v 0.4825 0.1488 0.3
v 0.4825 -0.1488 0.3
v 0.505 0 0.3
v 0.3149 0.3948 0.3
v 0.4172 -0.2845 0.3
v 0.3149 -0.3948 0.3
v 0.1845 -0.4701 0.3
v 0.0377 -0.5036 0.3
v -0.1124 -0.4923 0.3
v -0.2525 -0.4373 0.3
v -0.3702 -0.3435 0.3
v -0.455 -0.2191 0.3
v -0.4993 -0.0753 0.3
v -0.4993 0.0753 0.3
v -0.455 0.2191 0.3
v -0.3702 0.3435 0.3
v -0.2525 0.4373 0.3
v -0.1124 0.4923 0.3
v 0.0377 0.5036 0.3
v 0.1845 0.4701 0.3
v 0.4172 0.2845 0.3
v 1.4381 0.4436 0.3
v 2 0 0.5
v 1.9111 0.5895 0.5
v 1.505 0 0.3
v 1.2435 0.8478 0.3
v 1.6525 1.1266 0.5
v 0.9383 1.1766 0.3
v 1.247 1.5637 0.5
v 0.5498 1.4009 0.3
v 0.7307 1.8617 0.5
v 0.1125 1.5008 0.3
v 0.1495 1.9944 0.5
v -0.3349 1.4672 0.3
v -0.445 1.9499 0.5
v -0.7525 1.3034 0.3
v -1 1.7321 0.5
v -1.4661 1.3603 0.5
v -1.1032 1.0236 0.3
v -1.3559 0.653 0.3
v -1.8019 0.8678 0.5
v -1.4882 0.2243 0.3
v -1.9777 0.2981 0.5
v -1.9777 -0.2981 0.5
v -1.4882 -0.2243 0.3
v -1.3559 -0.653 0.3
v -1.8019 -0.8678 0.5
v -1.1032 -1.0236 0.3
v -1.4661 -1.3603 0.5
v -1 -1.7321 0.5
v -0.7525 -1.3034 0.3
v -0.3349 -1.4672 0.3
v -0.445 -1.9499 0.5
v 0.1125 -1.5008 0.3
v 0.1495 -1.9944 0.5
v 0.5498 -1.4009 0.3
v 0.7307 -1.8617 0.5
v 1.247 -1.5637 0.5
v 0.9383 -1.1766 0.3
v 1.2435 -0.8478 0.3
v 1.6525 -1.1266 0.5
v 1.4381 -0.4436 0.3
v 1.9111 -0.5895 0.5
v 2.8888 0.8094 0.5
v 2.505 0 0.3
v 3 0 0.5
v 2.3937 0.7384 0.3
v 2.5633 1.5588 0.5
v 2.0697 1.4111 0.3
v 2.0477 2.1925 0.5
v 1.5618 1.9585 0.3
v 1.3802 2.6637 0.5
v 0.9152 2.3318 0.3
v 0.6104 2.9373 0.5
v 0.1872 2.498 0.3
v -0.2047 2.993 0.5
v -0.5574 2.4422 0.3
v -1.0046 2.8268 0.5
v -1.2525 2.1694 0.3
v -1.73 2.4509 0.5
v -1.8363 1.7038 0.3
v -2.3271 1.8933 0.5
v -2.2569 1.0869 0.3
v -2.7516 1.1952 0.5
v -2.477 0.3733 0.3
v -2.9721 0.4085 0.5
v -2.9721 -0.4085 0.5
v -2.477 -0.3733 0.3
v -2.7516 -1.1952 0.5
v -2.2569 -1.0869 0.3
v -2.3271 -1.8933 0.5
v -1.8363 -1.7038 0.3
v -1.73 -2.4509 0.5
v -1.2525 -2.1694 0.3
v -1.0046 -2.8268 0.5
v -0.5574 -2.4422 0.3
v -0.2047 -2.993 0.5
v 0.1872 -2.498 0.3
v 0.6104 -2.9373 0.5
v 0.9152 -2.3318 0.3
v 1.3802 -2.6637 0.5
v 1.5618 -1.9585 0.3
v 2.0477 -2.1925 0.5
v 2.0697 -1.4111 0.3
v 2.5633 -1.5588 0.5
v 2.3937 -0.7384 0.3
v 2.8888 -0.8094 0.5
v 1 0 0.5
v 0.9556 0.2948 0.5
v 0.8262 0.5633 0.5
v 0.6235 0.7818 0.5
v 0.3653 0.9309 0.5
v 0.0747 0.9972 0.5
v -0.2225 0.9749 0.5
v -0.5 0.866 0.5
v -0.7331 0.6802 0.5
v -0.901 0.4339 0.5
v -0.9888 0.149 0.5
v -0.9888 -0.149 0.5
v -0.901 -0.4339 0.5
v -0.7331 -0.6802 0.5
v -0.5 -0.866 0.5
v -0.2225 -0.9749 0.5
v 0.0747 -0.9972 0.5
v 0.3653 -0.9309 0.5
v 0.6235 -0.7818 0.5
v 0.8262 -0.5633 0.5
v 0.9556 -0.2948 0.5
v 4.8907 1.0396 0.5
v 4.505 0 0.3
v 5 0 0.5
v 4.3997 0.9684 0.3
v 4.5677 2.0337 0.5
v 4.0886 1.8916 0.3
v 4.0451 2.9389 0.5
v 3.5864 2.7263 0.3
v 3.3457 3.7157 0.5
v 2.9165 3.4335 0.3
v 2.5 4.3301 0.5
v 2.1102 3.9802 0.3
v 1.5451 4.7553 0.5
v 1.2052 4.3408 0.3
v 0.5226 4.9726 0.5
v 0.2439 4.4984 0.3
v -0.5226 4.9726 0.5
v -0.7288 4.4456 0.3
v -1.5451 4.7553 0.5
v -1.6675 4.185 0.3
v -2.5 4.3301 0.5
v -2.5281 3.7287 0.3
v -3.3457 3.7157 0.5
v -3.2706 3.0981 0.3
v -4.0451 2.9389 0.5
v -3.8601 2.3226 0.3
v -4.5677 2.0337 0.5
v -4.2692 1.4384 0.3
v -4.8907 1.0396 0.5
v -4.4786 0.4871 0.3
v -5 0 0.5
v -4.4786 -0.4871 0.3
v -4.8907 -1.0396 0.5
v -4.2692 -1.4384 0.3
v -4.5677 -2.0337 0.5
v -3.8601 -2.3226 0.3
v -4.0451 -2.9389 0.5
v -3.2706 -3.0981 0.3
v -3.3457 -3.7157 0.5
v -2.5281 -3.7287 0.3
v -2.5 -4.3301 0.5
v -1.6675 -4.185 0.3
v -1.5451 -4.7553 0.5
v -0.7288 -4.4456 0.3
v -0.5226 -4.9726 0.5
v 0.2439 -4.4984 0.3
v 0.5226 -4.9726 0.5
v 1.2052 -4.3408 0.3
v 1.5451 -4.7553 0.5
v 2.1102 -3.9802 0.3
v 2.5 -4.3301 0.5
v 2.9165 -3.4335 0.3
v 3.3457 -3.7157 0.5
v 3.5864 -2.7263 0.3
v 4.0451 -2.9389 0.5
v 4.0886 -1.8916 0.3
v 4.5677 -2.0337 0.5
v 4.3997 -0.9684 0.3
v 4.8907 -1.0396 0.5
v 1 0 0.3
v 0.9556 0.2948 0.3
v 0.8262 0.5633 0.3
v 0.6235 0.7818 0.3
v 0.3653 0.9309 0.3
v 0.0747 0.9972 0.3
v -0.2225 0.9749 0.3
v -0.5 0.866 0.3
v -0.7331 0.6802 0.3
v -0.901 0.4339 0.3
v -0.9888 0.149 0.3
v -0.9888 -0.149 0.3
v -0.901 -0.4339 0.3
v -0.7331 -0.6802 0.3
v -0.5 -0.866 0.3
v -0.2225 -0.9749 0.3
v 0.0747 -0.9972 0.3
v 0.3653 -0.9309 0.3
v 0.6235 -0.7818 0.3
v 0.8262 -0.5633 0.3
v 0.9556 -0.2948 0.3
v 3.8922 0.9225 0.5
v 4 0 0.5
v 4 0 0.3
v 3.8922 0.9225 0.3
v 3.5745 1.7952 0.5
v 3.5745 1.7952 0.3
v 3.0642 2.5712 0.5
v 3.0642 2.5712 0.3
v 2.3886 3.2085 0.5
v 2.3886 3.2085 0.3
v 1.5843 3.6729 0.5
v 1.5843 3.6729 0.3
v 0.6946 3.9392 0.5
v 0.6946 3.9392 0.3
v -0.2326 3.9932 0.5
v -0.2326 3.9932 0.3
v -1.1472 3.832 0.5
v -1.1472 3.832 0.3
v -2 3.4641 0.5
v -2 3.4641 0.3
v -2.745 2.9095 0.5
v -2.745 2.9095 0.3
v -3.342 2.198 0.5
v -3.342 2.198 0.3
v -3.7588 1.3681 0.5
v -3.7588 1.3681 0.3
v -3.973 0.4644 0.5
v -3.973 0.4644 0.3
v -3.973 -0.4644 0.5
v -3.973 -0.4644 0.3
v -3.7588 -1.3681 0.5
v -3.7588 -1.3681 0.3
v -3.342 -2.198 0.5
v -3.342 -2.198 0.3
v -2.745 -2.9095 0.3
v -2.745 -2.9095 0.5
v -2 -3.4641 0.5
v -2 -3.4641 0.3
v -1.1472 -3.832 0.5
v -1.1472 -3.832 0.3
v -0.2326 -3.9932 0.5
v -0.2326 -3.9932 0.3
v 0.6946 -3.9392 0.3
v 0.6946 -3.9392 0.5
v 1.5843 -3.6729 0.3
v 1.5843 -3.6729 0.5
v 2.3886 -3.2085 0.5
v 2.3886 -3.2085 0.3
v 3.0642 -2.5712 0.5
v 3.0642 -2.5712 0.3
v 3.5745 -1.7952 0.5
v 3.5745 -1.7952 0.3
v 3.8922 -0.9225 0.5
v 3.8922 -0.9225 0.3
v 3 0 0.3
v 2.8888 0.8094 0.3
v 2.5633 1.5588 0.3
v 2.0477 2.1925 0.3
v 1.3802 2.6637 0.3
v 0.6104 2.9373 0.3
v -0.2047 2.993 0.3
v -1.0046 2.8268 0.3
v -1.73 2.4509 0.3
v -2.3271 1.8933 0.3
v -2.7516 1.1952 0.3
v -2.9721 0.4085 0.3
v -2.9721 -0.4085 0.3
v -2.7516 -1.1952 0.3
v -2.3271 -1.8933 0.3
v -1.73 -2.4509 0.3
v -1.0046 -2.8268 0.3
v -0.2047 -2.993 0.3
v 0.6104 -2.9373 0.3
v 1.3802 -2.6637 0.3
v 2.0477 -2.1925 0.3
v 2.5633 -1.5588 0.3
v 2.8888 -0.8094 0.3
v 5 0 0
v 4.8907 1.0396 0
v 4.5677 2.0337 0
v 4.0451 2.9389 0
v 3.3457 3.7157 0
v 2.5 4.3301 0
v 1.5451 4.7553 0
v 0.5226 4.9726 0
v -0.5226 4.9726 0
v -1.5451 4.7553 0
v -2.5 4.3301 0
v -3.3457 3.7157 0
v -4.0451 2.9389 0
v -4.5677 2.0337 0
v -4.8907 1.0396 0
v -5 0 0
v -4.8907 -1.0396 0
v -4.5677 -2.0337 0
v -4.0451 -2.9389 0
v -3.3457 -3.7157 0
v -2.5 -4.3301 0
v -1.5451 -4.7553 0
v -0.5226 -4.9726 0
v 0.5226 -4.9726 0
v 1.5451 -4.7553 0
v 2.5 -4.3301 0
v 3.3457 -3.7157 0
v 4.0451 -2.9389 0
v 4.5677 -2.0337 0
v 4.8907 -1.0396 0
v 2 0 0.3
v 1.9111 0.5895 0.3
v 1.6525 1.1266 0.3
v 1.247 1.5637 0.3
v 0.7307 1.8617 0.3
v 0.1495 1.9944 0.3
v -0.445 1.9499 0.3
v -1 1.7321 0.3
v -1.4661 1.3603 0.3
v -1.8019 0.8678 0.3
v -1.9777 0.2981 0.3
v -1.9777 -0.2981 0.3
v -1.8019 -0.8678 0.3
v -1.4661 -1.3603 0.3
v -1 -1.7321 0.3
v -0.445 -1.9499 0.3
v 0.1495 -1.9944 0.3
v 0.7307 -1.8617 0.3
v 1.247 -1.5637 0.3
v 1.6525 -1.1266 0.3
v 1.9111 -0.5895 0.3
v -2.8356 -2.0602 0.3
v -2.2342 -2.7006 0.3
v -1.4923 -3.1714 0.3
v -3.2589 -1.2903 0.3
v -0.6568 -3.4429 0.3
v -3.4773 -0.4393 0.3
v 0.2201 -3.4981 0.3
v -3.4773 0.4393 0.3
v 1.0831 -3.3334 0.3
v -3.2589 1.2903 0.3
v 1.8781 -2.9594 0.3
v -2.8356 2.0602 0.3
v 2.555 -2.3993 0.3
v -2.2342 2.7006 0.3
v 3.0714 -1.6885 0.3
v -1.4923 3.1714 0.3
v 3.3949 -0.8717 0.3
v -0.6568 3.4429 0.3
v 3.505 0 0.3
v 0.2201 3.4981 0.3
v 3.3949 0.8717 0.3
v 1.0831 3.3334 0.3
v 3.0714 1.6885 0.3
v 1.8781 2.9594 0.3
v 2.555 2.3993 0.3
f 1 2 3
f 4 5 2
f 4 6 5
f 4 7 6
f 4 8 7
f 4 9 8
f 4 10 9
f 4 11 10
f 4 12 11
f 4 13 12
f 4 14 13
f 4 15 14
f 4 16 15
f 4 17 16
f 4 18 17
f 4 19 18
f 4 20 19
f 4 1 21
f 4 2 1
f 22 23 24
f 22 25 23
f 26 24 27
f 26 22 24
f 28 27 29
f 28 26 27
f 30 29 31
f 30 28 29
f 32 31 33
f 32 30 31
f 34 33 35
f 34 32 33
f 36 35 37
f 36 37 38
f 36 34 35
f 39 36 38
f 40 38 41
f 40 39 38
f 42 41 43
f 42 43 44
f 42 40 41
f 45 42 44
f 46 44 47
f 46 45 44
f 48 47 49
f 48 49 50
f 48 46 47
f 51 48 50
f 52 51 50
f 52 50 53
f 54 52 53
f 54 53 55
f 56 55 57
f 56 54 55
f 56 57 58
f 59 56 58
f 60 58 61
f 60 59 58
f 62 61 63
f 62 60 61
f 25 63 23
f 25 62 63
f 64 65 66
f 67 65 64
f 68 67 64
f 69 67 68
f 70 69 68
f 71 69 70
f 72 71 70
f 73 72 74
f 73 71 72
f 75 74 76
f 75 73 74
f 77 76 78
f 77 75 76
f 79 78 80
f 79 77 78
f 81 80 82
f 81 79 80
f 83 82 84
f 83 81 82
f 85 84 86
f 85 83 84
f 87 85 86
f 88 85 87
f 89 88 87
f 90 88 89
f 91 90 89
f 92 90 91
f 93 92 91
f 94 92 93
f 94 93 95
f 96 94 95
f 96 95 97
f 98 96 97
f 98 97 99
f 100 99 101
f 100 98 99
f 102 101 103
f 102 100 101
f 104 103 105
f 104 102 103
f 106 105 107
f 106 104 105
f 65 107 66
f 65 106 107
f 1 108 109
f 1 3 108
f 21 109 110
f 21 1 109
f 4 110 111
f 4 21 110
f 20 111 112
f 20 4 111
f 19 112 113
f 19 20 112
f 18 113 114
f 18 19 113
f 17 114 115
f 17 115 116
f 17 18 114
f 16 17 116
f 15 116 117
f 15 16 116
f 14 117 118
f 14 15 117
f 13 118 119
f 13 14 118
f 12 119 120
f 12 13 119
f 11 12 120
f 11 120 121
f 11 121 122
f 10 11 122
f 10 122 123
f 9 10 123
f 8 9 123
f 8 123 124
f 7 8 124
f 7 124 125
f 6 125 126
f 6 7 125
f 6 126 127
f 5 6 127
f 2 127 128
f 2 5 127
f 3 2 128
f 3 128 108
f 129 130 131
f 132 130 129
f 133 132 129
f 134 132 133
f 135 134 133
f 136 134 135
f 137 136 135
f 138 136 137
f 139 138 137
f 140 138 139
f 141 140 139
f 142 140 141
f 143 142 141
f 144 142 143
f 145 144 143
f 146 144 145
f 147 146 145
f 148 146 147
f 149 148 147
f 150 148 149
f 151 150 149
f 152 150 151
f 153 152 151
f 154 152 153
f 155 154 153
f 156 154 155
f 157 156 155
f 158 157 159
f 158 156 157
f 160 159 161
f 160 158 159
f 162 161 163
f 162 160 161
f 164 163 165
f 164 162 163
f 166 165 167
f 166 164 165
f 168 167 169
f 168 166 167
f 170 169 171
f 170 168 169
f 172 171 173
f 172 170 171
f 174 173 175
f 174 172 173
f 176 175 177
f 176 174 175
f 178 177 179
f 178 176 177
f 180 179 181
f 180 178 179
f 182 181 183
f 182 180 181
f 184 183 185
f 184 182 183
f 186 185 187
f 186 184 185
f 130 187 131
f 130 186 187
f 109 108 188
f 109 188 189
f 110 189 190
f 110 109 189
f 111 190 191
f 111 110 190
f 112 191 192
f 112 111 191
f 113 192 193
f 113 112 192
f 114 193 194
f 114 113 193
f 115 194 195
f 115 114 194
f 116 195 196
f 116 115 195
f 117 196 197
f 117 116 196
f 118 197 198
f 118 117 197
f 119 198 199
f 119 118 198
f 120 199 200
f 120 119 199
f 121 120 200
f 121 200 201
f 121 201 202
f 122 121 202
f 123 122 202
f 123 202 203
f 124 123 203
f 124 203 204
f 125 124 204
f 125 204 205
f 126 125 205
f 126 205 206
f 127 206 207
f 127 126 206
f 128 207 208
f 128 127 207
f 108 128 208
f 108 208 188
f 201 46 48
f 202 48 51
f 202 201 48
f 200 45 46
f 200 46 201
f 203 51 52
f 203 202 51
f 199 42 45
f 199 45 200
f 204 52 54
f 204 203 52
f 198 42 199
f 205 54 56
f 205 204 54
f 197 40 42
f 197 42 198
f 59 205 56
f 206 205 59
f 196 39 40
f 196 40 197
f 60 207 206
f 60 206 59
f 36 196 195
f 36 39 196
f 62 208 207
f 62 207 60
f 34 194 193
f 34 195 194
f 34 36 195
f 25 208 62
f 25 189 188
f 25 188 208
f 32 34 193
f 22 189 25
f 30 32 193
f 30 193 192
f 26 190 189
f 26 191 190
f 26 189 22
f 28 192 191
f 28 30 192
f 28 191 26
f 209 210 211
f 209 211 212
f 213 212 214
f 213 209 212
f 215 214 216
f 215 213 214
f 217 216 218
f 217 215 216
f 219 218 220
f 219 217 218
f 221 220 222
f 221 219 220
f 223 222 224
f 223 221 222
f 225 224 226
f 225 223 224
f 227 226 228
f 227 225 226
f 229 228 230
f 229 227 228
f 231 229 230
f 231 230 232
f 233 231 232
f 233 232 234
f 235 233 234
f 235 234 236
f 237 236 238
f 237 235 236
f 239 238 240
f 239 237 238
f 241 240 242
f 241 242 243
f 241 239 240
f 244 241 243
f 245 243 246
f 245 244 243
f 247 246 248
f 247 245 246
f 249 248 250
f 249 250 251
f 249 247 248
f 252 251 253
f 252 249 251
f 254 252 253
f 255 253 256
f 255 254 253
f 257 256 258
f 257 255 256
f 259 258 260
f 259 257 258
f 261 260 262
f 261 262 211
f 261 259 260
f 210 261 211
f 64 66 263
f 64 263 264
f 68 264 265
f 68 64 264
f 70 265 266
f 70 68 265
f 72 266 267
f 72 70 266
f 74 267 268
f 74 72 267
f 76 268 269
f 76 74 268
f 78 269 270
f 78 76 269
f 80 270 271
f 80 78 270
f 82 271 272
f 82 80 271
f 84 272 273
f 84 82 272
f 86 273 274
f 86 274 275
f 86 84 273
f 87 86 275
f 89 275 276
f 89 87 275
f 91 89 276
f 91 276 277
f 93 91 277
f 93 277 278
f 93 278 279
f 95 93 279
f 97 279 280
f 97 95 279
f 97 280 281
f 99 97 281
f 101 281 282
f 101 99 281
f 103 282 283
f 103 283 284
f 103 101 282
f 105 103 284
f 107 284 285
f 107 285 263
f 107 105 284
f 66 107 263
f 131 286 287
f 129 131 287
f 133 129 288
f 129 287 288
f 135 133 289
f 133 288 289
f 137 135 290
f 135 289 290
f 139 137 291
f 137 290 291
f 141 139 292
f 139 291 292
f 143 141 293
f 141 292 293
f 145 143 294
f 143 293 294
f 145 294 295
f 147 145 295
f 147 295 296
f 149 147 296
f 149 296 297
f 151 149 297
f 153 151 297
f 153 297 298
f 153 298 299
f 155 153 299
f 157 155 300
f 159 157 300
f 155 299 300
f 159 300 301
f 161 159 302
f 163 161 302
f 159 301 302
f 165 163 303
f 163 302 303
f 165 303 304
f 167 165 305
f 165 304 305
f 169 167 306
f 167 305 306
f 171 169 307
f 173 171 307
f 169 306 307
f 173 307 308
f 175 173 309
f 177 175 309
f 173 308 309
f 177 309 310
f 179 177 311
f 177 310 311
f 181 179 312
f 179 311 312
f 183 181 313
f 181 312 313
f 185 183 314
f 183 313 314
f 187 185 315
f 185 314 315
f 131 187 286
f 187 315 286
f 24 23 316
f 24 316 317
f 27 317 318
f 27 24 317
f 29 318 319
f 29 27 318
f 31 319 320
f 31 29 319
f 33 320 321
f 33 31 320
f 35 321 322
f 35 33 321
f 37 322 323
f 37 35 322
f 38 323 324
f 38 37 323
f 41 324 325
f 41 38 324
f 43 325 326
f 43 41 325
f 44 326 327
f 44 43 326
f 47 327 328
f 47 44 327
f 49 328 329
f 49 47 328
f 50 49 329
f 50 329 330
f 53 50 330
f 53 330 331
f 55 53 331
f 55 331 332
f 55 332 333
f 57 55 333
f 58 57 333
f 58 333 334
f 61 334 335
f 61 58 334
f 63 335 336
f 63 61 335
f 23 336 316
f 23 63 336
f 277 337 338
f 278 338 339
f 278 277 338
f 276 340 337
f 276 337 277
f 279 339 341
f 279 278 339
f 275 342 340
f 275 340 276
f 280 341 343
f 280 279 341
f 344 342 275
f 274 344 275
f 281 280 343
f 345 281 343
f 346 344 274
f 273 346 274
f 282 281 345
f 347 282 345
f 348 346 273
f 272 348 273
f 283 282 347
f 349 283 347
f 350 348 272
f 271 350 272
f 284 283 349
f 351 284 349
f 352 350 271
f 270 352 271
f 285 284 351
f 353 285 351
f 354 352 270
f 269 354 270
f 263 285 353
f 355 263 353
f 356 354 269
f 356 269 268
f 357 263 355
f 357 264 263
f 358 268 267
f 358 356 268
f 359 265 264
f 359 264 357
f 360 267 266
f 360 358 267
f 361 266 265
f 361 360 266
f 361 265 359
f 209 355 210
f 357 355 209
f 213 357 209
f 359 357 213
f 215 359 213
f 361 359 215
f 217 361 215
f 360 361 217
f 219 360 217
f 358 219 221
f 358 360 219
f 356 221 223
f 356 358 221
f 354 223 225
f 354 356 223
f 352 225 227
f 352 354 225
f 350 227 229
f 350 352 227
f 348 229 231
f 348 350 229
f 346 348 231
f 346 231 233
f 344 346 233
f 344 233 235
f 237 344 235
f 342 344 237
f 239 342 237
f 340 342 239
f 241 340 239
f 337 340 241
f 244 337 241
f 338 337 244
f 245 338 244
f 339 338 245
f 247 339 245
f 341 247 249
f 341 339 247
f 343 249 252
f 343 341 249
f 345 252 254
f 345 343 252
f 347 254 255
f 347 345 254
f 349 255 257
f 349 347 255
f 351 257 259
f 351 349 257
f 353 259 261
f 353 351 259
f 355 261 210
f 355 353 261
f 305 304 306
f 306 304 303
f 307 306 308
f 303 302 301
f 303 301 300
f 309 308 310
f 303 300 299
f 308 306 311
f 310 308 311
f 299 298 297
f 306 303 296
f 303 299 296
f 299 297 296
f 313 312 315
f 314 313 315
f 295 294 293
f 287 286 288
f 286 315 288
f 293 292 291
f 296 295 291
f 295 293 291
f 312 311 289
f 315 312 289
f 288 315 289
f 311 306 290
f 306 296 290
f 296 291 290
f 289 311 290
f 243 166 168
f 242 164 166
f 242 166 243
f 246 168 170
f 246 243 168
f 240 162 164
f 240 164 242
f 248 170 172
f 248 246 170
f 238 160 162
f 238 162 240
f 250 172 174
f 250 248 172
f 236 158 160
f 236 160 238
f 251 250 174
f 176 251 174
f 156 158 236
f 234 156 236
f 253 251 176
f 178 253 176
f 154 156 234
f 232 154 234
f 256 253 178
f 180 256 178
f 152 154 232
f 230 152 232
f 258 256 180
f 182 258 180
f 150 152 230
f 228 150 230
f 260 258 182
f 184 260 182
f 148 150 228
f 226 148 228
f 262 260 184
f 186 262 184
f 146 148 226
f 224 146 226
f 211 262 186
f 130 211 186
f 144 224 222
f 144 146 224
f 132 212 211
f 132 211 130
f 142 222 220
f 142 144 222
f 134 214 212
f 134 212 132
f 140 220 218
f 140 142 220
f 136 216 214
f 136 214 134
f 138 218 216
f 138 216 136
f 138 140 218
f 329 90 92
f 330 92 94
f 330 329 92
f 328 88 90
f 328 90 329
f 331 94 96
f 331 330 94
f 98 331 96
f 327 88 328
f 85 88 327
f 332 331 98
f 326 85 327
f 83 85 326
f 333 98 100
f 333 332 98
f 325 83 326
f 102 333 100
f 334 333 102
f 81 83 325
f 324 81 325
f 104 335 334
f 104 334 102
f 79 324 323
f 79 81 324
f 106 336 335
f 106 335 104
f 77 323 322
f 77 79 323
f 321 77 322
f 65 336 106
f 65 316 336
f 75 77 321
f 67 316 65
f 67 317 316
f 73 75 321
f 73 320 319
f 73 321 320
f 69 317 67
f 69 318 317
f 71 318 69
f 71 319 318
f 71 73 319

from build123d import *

# Parameters (mm, degrees)
ESQUISSE1_R             = 5
BOSS_EXTRU_1_DEPTH      = 0.5
ESQUISSE2_R             = 4.5
ESQUISSE2_R_2           = 4
ESQUISSE2_R_3           = 3.5
ESQUISSE2_R_4           = 3
ESQUISSE2_R_5           = 2.5
ESQUISSE2_R_6           = 2
ESQUISSE2_R_7           = 1.5
ESQUISSE2_R_8           = 1
ESQUISSE2_R_9           = 0.5
ENL_V_MAT_EXTRU_2_DEPTH = 0.2
CHANFREIN1_SIZE         = 0.5
CHANFREIN1_SIZE_2       = 0.202013113


with BuildPart() as part:
    # Esquisse1 → Boss.-Extru.1 (new body)
    with BuildSketch(Plane.XY):
        Circle(ESQUISSE1_R)
    extrude(amount=BOSS_EXTRU_1_DEPTH)

    # Esquisse2 → Enlèv. mat.-Extru.2 (cut)
    # profile 1 of 5: a face of its own
    with BuildSketch(Plane.XY.offset(0.5)):
        Circle(ESQUISSE2_R)
        Circle(ESQUISSE2_R_2, mode=Mode.SUBTRACT)
    # profile 2 of 5: a face of its own
    with BuildSketch(Plane.XY.offset(0.5)):
        Circle(ESQUISSE2_R_3)
        Circle(ESQUISSE2_R_4, mode=Mode.SUBTRACT)
    # profile 3 of 5: a face of its own
    with BuildSketch(Plane.XY.offset(0.5)):
        Circle(ESQUISSE2_R_5)
        Circle(ESQUISSE2_R_6, mode=Mode.SUBTRACT)
    # profile 4 of 5: a face of its own
    with BuildSketch(Plane.XY.offset(0.5)):
        Circle(ESQUISSE2_R_7)
        Circle(ESQUISSE2_R_8, mode=Mode.SUBTRACT)
    # profile 5 of 5: a face of its own
    with BuildSketch(Plane.XY.offset(0.5)):
        Circle(ESQUISSE2_R_9)
    extrude(amount=-ENL_V_MAT_EXTRU_2_DEPTH, mode=Mode.SUBTRACT)

    # Chanfrein1
    # the kernel refuses this chamfer: 0.5, 0.202013113 mm, written as the material it takes off along each edge
    with BuildSketch(Plane(origin=(0, 0, 0.5), x_dir=(1, 0, 0), z_dir=(0, -1, 0))) as chanfrein1_piece_1_section:
        Polygon((0.5 + CHANFREIN1_SIZE, 0), (0.5, -CHANFREIN1_SIZE_2), (0.5, 0), align=None)
    chanfrein1_piece_1 = revolve(axis=Axis((0, 0, 0.5), (0, 0, 1)), mode=Mode.PRIVATE)
    chanfrein1_piece_1 = split(chanfrein1_piece_1, bisect_by=Plane(origin=(-0.759410198, 0, 0.3), z_dir=(0, 0, 1)), keep=Keep.TOP, mode=Mode.PRIVATE)
    add(chanfrein1_piece_1, mode=Mode.SUBTRACT)
    with BuildSketch(Plane(origin=(0, 0, 0.5), x_dir=(1, 0, 0), z_dir=(0, -1, 0))) as chanfrein1_piece_2_section:
        Polygon((1.5 + CHANFREIN1_SIZE, 0), (1.5, -CHANFREIN1_SIZE_2), (1.5, 0), align=None)
    chanfrein1_piece_2 = revolve(axis=Axis((0, 0, 0.5), (0, 0, 1)), mode=Mode.PRIVATE)
    chanfrein1_piece_2 = split(chanfrein1_piece_2, bisect_by=Plane(origin=(-1.758573668, 0, 0.3), z_dir=(0, 0, 1)), keep=Keep.TOP, mode=Mode.PRIVATE)
    add(chanfrein1_piece_2, mode=Mode.SUBTRACT)
    with BuildSketch(Plane(origin=(0, 0, 0.5), x_dir=(1, 0, 0), z_dir=(0, -1, 0))) as chanfrein1_piece_3_section:
        Polygon((2.5 + CHANFREIN1_SIZE, 0), (2.5, -CHANFREIN1_SIZE_2), (2.5, 0), align=None)
    chanfrein1_piece_3 = revolve(axis=Axis((0, 0, 0.5), (0, 0, 1)), mode=Mode.PRIVATE)
    chanfrein1_piece_3 = split(chanfrein1_piece_3, bisect_by=Plane(origin=(-2.75803387, 0, 0.3), z_dir=(0, 0, 1)), keep=Keep.TOP, mode=Mode.PRIVATE)
    add(chanfrein1_piece_3, mode=Mode.SUBTRACT)
    with BuildSketch(Plane(origin=(0, 0, 0.5), x_dir=(1, 0, 0), z_dir=(0, -1, 0))) as chanfrein1_piece_4_section:
        Polygon((3.5 + CHANFREIN1_SIZE, 0), (3.5, -CHANFREIN1_SIZE_2), (3.5, 0), align=None)
    chanfrein1_piece_4 = revolve(axis=Axis((0, 0, 0.5), (0, 0, 1)), mode=Mode.PRIVATE)
    chanfrein1_piece_4 = split(chanfrein1_piece_4, bisect_by=Plane(origin=(-3.757616815, 0, 0.3), z_dir=(0, 0, 1)), keep=Keep.TOP, mode=Mode.PRIVATE)
    add(chanfrein1_piece_4, mode=Mode.SUBTRACT)
    with BuildSketch(Plane(origin=(0, 0, 0.5), x_dir=(1, 0, 0), z_dir=(0, -1, 0))) as chanfrein1_piece_5_section:
        Polygon((4.5 + CHANFREIN1_SIZE, 0), (4.5, -CHANFREIN1_SIZE_2), (4.5, 0), align=None)
    chanfrein1_piece_5 = revolve(axis=Axis((0, 0, 0.5), (0, 0, 1)), mode=Mode.PRIVATE)
    chanfrein1_piece_5 = split(chanfrein1_piece_5, bisect_by=Plane(origin=(-4.757270103, 0, 0.3), z_dir=(0, 0, 1)), keep=Keep.TOP, mode=Mode.PRIVATE)
    add(chanfrein1_piece_5, mode=Mode.SUBTRACT)


solid = part.part
